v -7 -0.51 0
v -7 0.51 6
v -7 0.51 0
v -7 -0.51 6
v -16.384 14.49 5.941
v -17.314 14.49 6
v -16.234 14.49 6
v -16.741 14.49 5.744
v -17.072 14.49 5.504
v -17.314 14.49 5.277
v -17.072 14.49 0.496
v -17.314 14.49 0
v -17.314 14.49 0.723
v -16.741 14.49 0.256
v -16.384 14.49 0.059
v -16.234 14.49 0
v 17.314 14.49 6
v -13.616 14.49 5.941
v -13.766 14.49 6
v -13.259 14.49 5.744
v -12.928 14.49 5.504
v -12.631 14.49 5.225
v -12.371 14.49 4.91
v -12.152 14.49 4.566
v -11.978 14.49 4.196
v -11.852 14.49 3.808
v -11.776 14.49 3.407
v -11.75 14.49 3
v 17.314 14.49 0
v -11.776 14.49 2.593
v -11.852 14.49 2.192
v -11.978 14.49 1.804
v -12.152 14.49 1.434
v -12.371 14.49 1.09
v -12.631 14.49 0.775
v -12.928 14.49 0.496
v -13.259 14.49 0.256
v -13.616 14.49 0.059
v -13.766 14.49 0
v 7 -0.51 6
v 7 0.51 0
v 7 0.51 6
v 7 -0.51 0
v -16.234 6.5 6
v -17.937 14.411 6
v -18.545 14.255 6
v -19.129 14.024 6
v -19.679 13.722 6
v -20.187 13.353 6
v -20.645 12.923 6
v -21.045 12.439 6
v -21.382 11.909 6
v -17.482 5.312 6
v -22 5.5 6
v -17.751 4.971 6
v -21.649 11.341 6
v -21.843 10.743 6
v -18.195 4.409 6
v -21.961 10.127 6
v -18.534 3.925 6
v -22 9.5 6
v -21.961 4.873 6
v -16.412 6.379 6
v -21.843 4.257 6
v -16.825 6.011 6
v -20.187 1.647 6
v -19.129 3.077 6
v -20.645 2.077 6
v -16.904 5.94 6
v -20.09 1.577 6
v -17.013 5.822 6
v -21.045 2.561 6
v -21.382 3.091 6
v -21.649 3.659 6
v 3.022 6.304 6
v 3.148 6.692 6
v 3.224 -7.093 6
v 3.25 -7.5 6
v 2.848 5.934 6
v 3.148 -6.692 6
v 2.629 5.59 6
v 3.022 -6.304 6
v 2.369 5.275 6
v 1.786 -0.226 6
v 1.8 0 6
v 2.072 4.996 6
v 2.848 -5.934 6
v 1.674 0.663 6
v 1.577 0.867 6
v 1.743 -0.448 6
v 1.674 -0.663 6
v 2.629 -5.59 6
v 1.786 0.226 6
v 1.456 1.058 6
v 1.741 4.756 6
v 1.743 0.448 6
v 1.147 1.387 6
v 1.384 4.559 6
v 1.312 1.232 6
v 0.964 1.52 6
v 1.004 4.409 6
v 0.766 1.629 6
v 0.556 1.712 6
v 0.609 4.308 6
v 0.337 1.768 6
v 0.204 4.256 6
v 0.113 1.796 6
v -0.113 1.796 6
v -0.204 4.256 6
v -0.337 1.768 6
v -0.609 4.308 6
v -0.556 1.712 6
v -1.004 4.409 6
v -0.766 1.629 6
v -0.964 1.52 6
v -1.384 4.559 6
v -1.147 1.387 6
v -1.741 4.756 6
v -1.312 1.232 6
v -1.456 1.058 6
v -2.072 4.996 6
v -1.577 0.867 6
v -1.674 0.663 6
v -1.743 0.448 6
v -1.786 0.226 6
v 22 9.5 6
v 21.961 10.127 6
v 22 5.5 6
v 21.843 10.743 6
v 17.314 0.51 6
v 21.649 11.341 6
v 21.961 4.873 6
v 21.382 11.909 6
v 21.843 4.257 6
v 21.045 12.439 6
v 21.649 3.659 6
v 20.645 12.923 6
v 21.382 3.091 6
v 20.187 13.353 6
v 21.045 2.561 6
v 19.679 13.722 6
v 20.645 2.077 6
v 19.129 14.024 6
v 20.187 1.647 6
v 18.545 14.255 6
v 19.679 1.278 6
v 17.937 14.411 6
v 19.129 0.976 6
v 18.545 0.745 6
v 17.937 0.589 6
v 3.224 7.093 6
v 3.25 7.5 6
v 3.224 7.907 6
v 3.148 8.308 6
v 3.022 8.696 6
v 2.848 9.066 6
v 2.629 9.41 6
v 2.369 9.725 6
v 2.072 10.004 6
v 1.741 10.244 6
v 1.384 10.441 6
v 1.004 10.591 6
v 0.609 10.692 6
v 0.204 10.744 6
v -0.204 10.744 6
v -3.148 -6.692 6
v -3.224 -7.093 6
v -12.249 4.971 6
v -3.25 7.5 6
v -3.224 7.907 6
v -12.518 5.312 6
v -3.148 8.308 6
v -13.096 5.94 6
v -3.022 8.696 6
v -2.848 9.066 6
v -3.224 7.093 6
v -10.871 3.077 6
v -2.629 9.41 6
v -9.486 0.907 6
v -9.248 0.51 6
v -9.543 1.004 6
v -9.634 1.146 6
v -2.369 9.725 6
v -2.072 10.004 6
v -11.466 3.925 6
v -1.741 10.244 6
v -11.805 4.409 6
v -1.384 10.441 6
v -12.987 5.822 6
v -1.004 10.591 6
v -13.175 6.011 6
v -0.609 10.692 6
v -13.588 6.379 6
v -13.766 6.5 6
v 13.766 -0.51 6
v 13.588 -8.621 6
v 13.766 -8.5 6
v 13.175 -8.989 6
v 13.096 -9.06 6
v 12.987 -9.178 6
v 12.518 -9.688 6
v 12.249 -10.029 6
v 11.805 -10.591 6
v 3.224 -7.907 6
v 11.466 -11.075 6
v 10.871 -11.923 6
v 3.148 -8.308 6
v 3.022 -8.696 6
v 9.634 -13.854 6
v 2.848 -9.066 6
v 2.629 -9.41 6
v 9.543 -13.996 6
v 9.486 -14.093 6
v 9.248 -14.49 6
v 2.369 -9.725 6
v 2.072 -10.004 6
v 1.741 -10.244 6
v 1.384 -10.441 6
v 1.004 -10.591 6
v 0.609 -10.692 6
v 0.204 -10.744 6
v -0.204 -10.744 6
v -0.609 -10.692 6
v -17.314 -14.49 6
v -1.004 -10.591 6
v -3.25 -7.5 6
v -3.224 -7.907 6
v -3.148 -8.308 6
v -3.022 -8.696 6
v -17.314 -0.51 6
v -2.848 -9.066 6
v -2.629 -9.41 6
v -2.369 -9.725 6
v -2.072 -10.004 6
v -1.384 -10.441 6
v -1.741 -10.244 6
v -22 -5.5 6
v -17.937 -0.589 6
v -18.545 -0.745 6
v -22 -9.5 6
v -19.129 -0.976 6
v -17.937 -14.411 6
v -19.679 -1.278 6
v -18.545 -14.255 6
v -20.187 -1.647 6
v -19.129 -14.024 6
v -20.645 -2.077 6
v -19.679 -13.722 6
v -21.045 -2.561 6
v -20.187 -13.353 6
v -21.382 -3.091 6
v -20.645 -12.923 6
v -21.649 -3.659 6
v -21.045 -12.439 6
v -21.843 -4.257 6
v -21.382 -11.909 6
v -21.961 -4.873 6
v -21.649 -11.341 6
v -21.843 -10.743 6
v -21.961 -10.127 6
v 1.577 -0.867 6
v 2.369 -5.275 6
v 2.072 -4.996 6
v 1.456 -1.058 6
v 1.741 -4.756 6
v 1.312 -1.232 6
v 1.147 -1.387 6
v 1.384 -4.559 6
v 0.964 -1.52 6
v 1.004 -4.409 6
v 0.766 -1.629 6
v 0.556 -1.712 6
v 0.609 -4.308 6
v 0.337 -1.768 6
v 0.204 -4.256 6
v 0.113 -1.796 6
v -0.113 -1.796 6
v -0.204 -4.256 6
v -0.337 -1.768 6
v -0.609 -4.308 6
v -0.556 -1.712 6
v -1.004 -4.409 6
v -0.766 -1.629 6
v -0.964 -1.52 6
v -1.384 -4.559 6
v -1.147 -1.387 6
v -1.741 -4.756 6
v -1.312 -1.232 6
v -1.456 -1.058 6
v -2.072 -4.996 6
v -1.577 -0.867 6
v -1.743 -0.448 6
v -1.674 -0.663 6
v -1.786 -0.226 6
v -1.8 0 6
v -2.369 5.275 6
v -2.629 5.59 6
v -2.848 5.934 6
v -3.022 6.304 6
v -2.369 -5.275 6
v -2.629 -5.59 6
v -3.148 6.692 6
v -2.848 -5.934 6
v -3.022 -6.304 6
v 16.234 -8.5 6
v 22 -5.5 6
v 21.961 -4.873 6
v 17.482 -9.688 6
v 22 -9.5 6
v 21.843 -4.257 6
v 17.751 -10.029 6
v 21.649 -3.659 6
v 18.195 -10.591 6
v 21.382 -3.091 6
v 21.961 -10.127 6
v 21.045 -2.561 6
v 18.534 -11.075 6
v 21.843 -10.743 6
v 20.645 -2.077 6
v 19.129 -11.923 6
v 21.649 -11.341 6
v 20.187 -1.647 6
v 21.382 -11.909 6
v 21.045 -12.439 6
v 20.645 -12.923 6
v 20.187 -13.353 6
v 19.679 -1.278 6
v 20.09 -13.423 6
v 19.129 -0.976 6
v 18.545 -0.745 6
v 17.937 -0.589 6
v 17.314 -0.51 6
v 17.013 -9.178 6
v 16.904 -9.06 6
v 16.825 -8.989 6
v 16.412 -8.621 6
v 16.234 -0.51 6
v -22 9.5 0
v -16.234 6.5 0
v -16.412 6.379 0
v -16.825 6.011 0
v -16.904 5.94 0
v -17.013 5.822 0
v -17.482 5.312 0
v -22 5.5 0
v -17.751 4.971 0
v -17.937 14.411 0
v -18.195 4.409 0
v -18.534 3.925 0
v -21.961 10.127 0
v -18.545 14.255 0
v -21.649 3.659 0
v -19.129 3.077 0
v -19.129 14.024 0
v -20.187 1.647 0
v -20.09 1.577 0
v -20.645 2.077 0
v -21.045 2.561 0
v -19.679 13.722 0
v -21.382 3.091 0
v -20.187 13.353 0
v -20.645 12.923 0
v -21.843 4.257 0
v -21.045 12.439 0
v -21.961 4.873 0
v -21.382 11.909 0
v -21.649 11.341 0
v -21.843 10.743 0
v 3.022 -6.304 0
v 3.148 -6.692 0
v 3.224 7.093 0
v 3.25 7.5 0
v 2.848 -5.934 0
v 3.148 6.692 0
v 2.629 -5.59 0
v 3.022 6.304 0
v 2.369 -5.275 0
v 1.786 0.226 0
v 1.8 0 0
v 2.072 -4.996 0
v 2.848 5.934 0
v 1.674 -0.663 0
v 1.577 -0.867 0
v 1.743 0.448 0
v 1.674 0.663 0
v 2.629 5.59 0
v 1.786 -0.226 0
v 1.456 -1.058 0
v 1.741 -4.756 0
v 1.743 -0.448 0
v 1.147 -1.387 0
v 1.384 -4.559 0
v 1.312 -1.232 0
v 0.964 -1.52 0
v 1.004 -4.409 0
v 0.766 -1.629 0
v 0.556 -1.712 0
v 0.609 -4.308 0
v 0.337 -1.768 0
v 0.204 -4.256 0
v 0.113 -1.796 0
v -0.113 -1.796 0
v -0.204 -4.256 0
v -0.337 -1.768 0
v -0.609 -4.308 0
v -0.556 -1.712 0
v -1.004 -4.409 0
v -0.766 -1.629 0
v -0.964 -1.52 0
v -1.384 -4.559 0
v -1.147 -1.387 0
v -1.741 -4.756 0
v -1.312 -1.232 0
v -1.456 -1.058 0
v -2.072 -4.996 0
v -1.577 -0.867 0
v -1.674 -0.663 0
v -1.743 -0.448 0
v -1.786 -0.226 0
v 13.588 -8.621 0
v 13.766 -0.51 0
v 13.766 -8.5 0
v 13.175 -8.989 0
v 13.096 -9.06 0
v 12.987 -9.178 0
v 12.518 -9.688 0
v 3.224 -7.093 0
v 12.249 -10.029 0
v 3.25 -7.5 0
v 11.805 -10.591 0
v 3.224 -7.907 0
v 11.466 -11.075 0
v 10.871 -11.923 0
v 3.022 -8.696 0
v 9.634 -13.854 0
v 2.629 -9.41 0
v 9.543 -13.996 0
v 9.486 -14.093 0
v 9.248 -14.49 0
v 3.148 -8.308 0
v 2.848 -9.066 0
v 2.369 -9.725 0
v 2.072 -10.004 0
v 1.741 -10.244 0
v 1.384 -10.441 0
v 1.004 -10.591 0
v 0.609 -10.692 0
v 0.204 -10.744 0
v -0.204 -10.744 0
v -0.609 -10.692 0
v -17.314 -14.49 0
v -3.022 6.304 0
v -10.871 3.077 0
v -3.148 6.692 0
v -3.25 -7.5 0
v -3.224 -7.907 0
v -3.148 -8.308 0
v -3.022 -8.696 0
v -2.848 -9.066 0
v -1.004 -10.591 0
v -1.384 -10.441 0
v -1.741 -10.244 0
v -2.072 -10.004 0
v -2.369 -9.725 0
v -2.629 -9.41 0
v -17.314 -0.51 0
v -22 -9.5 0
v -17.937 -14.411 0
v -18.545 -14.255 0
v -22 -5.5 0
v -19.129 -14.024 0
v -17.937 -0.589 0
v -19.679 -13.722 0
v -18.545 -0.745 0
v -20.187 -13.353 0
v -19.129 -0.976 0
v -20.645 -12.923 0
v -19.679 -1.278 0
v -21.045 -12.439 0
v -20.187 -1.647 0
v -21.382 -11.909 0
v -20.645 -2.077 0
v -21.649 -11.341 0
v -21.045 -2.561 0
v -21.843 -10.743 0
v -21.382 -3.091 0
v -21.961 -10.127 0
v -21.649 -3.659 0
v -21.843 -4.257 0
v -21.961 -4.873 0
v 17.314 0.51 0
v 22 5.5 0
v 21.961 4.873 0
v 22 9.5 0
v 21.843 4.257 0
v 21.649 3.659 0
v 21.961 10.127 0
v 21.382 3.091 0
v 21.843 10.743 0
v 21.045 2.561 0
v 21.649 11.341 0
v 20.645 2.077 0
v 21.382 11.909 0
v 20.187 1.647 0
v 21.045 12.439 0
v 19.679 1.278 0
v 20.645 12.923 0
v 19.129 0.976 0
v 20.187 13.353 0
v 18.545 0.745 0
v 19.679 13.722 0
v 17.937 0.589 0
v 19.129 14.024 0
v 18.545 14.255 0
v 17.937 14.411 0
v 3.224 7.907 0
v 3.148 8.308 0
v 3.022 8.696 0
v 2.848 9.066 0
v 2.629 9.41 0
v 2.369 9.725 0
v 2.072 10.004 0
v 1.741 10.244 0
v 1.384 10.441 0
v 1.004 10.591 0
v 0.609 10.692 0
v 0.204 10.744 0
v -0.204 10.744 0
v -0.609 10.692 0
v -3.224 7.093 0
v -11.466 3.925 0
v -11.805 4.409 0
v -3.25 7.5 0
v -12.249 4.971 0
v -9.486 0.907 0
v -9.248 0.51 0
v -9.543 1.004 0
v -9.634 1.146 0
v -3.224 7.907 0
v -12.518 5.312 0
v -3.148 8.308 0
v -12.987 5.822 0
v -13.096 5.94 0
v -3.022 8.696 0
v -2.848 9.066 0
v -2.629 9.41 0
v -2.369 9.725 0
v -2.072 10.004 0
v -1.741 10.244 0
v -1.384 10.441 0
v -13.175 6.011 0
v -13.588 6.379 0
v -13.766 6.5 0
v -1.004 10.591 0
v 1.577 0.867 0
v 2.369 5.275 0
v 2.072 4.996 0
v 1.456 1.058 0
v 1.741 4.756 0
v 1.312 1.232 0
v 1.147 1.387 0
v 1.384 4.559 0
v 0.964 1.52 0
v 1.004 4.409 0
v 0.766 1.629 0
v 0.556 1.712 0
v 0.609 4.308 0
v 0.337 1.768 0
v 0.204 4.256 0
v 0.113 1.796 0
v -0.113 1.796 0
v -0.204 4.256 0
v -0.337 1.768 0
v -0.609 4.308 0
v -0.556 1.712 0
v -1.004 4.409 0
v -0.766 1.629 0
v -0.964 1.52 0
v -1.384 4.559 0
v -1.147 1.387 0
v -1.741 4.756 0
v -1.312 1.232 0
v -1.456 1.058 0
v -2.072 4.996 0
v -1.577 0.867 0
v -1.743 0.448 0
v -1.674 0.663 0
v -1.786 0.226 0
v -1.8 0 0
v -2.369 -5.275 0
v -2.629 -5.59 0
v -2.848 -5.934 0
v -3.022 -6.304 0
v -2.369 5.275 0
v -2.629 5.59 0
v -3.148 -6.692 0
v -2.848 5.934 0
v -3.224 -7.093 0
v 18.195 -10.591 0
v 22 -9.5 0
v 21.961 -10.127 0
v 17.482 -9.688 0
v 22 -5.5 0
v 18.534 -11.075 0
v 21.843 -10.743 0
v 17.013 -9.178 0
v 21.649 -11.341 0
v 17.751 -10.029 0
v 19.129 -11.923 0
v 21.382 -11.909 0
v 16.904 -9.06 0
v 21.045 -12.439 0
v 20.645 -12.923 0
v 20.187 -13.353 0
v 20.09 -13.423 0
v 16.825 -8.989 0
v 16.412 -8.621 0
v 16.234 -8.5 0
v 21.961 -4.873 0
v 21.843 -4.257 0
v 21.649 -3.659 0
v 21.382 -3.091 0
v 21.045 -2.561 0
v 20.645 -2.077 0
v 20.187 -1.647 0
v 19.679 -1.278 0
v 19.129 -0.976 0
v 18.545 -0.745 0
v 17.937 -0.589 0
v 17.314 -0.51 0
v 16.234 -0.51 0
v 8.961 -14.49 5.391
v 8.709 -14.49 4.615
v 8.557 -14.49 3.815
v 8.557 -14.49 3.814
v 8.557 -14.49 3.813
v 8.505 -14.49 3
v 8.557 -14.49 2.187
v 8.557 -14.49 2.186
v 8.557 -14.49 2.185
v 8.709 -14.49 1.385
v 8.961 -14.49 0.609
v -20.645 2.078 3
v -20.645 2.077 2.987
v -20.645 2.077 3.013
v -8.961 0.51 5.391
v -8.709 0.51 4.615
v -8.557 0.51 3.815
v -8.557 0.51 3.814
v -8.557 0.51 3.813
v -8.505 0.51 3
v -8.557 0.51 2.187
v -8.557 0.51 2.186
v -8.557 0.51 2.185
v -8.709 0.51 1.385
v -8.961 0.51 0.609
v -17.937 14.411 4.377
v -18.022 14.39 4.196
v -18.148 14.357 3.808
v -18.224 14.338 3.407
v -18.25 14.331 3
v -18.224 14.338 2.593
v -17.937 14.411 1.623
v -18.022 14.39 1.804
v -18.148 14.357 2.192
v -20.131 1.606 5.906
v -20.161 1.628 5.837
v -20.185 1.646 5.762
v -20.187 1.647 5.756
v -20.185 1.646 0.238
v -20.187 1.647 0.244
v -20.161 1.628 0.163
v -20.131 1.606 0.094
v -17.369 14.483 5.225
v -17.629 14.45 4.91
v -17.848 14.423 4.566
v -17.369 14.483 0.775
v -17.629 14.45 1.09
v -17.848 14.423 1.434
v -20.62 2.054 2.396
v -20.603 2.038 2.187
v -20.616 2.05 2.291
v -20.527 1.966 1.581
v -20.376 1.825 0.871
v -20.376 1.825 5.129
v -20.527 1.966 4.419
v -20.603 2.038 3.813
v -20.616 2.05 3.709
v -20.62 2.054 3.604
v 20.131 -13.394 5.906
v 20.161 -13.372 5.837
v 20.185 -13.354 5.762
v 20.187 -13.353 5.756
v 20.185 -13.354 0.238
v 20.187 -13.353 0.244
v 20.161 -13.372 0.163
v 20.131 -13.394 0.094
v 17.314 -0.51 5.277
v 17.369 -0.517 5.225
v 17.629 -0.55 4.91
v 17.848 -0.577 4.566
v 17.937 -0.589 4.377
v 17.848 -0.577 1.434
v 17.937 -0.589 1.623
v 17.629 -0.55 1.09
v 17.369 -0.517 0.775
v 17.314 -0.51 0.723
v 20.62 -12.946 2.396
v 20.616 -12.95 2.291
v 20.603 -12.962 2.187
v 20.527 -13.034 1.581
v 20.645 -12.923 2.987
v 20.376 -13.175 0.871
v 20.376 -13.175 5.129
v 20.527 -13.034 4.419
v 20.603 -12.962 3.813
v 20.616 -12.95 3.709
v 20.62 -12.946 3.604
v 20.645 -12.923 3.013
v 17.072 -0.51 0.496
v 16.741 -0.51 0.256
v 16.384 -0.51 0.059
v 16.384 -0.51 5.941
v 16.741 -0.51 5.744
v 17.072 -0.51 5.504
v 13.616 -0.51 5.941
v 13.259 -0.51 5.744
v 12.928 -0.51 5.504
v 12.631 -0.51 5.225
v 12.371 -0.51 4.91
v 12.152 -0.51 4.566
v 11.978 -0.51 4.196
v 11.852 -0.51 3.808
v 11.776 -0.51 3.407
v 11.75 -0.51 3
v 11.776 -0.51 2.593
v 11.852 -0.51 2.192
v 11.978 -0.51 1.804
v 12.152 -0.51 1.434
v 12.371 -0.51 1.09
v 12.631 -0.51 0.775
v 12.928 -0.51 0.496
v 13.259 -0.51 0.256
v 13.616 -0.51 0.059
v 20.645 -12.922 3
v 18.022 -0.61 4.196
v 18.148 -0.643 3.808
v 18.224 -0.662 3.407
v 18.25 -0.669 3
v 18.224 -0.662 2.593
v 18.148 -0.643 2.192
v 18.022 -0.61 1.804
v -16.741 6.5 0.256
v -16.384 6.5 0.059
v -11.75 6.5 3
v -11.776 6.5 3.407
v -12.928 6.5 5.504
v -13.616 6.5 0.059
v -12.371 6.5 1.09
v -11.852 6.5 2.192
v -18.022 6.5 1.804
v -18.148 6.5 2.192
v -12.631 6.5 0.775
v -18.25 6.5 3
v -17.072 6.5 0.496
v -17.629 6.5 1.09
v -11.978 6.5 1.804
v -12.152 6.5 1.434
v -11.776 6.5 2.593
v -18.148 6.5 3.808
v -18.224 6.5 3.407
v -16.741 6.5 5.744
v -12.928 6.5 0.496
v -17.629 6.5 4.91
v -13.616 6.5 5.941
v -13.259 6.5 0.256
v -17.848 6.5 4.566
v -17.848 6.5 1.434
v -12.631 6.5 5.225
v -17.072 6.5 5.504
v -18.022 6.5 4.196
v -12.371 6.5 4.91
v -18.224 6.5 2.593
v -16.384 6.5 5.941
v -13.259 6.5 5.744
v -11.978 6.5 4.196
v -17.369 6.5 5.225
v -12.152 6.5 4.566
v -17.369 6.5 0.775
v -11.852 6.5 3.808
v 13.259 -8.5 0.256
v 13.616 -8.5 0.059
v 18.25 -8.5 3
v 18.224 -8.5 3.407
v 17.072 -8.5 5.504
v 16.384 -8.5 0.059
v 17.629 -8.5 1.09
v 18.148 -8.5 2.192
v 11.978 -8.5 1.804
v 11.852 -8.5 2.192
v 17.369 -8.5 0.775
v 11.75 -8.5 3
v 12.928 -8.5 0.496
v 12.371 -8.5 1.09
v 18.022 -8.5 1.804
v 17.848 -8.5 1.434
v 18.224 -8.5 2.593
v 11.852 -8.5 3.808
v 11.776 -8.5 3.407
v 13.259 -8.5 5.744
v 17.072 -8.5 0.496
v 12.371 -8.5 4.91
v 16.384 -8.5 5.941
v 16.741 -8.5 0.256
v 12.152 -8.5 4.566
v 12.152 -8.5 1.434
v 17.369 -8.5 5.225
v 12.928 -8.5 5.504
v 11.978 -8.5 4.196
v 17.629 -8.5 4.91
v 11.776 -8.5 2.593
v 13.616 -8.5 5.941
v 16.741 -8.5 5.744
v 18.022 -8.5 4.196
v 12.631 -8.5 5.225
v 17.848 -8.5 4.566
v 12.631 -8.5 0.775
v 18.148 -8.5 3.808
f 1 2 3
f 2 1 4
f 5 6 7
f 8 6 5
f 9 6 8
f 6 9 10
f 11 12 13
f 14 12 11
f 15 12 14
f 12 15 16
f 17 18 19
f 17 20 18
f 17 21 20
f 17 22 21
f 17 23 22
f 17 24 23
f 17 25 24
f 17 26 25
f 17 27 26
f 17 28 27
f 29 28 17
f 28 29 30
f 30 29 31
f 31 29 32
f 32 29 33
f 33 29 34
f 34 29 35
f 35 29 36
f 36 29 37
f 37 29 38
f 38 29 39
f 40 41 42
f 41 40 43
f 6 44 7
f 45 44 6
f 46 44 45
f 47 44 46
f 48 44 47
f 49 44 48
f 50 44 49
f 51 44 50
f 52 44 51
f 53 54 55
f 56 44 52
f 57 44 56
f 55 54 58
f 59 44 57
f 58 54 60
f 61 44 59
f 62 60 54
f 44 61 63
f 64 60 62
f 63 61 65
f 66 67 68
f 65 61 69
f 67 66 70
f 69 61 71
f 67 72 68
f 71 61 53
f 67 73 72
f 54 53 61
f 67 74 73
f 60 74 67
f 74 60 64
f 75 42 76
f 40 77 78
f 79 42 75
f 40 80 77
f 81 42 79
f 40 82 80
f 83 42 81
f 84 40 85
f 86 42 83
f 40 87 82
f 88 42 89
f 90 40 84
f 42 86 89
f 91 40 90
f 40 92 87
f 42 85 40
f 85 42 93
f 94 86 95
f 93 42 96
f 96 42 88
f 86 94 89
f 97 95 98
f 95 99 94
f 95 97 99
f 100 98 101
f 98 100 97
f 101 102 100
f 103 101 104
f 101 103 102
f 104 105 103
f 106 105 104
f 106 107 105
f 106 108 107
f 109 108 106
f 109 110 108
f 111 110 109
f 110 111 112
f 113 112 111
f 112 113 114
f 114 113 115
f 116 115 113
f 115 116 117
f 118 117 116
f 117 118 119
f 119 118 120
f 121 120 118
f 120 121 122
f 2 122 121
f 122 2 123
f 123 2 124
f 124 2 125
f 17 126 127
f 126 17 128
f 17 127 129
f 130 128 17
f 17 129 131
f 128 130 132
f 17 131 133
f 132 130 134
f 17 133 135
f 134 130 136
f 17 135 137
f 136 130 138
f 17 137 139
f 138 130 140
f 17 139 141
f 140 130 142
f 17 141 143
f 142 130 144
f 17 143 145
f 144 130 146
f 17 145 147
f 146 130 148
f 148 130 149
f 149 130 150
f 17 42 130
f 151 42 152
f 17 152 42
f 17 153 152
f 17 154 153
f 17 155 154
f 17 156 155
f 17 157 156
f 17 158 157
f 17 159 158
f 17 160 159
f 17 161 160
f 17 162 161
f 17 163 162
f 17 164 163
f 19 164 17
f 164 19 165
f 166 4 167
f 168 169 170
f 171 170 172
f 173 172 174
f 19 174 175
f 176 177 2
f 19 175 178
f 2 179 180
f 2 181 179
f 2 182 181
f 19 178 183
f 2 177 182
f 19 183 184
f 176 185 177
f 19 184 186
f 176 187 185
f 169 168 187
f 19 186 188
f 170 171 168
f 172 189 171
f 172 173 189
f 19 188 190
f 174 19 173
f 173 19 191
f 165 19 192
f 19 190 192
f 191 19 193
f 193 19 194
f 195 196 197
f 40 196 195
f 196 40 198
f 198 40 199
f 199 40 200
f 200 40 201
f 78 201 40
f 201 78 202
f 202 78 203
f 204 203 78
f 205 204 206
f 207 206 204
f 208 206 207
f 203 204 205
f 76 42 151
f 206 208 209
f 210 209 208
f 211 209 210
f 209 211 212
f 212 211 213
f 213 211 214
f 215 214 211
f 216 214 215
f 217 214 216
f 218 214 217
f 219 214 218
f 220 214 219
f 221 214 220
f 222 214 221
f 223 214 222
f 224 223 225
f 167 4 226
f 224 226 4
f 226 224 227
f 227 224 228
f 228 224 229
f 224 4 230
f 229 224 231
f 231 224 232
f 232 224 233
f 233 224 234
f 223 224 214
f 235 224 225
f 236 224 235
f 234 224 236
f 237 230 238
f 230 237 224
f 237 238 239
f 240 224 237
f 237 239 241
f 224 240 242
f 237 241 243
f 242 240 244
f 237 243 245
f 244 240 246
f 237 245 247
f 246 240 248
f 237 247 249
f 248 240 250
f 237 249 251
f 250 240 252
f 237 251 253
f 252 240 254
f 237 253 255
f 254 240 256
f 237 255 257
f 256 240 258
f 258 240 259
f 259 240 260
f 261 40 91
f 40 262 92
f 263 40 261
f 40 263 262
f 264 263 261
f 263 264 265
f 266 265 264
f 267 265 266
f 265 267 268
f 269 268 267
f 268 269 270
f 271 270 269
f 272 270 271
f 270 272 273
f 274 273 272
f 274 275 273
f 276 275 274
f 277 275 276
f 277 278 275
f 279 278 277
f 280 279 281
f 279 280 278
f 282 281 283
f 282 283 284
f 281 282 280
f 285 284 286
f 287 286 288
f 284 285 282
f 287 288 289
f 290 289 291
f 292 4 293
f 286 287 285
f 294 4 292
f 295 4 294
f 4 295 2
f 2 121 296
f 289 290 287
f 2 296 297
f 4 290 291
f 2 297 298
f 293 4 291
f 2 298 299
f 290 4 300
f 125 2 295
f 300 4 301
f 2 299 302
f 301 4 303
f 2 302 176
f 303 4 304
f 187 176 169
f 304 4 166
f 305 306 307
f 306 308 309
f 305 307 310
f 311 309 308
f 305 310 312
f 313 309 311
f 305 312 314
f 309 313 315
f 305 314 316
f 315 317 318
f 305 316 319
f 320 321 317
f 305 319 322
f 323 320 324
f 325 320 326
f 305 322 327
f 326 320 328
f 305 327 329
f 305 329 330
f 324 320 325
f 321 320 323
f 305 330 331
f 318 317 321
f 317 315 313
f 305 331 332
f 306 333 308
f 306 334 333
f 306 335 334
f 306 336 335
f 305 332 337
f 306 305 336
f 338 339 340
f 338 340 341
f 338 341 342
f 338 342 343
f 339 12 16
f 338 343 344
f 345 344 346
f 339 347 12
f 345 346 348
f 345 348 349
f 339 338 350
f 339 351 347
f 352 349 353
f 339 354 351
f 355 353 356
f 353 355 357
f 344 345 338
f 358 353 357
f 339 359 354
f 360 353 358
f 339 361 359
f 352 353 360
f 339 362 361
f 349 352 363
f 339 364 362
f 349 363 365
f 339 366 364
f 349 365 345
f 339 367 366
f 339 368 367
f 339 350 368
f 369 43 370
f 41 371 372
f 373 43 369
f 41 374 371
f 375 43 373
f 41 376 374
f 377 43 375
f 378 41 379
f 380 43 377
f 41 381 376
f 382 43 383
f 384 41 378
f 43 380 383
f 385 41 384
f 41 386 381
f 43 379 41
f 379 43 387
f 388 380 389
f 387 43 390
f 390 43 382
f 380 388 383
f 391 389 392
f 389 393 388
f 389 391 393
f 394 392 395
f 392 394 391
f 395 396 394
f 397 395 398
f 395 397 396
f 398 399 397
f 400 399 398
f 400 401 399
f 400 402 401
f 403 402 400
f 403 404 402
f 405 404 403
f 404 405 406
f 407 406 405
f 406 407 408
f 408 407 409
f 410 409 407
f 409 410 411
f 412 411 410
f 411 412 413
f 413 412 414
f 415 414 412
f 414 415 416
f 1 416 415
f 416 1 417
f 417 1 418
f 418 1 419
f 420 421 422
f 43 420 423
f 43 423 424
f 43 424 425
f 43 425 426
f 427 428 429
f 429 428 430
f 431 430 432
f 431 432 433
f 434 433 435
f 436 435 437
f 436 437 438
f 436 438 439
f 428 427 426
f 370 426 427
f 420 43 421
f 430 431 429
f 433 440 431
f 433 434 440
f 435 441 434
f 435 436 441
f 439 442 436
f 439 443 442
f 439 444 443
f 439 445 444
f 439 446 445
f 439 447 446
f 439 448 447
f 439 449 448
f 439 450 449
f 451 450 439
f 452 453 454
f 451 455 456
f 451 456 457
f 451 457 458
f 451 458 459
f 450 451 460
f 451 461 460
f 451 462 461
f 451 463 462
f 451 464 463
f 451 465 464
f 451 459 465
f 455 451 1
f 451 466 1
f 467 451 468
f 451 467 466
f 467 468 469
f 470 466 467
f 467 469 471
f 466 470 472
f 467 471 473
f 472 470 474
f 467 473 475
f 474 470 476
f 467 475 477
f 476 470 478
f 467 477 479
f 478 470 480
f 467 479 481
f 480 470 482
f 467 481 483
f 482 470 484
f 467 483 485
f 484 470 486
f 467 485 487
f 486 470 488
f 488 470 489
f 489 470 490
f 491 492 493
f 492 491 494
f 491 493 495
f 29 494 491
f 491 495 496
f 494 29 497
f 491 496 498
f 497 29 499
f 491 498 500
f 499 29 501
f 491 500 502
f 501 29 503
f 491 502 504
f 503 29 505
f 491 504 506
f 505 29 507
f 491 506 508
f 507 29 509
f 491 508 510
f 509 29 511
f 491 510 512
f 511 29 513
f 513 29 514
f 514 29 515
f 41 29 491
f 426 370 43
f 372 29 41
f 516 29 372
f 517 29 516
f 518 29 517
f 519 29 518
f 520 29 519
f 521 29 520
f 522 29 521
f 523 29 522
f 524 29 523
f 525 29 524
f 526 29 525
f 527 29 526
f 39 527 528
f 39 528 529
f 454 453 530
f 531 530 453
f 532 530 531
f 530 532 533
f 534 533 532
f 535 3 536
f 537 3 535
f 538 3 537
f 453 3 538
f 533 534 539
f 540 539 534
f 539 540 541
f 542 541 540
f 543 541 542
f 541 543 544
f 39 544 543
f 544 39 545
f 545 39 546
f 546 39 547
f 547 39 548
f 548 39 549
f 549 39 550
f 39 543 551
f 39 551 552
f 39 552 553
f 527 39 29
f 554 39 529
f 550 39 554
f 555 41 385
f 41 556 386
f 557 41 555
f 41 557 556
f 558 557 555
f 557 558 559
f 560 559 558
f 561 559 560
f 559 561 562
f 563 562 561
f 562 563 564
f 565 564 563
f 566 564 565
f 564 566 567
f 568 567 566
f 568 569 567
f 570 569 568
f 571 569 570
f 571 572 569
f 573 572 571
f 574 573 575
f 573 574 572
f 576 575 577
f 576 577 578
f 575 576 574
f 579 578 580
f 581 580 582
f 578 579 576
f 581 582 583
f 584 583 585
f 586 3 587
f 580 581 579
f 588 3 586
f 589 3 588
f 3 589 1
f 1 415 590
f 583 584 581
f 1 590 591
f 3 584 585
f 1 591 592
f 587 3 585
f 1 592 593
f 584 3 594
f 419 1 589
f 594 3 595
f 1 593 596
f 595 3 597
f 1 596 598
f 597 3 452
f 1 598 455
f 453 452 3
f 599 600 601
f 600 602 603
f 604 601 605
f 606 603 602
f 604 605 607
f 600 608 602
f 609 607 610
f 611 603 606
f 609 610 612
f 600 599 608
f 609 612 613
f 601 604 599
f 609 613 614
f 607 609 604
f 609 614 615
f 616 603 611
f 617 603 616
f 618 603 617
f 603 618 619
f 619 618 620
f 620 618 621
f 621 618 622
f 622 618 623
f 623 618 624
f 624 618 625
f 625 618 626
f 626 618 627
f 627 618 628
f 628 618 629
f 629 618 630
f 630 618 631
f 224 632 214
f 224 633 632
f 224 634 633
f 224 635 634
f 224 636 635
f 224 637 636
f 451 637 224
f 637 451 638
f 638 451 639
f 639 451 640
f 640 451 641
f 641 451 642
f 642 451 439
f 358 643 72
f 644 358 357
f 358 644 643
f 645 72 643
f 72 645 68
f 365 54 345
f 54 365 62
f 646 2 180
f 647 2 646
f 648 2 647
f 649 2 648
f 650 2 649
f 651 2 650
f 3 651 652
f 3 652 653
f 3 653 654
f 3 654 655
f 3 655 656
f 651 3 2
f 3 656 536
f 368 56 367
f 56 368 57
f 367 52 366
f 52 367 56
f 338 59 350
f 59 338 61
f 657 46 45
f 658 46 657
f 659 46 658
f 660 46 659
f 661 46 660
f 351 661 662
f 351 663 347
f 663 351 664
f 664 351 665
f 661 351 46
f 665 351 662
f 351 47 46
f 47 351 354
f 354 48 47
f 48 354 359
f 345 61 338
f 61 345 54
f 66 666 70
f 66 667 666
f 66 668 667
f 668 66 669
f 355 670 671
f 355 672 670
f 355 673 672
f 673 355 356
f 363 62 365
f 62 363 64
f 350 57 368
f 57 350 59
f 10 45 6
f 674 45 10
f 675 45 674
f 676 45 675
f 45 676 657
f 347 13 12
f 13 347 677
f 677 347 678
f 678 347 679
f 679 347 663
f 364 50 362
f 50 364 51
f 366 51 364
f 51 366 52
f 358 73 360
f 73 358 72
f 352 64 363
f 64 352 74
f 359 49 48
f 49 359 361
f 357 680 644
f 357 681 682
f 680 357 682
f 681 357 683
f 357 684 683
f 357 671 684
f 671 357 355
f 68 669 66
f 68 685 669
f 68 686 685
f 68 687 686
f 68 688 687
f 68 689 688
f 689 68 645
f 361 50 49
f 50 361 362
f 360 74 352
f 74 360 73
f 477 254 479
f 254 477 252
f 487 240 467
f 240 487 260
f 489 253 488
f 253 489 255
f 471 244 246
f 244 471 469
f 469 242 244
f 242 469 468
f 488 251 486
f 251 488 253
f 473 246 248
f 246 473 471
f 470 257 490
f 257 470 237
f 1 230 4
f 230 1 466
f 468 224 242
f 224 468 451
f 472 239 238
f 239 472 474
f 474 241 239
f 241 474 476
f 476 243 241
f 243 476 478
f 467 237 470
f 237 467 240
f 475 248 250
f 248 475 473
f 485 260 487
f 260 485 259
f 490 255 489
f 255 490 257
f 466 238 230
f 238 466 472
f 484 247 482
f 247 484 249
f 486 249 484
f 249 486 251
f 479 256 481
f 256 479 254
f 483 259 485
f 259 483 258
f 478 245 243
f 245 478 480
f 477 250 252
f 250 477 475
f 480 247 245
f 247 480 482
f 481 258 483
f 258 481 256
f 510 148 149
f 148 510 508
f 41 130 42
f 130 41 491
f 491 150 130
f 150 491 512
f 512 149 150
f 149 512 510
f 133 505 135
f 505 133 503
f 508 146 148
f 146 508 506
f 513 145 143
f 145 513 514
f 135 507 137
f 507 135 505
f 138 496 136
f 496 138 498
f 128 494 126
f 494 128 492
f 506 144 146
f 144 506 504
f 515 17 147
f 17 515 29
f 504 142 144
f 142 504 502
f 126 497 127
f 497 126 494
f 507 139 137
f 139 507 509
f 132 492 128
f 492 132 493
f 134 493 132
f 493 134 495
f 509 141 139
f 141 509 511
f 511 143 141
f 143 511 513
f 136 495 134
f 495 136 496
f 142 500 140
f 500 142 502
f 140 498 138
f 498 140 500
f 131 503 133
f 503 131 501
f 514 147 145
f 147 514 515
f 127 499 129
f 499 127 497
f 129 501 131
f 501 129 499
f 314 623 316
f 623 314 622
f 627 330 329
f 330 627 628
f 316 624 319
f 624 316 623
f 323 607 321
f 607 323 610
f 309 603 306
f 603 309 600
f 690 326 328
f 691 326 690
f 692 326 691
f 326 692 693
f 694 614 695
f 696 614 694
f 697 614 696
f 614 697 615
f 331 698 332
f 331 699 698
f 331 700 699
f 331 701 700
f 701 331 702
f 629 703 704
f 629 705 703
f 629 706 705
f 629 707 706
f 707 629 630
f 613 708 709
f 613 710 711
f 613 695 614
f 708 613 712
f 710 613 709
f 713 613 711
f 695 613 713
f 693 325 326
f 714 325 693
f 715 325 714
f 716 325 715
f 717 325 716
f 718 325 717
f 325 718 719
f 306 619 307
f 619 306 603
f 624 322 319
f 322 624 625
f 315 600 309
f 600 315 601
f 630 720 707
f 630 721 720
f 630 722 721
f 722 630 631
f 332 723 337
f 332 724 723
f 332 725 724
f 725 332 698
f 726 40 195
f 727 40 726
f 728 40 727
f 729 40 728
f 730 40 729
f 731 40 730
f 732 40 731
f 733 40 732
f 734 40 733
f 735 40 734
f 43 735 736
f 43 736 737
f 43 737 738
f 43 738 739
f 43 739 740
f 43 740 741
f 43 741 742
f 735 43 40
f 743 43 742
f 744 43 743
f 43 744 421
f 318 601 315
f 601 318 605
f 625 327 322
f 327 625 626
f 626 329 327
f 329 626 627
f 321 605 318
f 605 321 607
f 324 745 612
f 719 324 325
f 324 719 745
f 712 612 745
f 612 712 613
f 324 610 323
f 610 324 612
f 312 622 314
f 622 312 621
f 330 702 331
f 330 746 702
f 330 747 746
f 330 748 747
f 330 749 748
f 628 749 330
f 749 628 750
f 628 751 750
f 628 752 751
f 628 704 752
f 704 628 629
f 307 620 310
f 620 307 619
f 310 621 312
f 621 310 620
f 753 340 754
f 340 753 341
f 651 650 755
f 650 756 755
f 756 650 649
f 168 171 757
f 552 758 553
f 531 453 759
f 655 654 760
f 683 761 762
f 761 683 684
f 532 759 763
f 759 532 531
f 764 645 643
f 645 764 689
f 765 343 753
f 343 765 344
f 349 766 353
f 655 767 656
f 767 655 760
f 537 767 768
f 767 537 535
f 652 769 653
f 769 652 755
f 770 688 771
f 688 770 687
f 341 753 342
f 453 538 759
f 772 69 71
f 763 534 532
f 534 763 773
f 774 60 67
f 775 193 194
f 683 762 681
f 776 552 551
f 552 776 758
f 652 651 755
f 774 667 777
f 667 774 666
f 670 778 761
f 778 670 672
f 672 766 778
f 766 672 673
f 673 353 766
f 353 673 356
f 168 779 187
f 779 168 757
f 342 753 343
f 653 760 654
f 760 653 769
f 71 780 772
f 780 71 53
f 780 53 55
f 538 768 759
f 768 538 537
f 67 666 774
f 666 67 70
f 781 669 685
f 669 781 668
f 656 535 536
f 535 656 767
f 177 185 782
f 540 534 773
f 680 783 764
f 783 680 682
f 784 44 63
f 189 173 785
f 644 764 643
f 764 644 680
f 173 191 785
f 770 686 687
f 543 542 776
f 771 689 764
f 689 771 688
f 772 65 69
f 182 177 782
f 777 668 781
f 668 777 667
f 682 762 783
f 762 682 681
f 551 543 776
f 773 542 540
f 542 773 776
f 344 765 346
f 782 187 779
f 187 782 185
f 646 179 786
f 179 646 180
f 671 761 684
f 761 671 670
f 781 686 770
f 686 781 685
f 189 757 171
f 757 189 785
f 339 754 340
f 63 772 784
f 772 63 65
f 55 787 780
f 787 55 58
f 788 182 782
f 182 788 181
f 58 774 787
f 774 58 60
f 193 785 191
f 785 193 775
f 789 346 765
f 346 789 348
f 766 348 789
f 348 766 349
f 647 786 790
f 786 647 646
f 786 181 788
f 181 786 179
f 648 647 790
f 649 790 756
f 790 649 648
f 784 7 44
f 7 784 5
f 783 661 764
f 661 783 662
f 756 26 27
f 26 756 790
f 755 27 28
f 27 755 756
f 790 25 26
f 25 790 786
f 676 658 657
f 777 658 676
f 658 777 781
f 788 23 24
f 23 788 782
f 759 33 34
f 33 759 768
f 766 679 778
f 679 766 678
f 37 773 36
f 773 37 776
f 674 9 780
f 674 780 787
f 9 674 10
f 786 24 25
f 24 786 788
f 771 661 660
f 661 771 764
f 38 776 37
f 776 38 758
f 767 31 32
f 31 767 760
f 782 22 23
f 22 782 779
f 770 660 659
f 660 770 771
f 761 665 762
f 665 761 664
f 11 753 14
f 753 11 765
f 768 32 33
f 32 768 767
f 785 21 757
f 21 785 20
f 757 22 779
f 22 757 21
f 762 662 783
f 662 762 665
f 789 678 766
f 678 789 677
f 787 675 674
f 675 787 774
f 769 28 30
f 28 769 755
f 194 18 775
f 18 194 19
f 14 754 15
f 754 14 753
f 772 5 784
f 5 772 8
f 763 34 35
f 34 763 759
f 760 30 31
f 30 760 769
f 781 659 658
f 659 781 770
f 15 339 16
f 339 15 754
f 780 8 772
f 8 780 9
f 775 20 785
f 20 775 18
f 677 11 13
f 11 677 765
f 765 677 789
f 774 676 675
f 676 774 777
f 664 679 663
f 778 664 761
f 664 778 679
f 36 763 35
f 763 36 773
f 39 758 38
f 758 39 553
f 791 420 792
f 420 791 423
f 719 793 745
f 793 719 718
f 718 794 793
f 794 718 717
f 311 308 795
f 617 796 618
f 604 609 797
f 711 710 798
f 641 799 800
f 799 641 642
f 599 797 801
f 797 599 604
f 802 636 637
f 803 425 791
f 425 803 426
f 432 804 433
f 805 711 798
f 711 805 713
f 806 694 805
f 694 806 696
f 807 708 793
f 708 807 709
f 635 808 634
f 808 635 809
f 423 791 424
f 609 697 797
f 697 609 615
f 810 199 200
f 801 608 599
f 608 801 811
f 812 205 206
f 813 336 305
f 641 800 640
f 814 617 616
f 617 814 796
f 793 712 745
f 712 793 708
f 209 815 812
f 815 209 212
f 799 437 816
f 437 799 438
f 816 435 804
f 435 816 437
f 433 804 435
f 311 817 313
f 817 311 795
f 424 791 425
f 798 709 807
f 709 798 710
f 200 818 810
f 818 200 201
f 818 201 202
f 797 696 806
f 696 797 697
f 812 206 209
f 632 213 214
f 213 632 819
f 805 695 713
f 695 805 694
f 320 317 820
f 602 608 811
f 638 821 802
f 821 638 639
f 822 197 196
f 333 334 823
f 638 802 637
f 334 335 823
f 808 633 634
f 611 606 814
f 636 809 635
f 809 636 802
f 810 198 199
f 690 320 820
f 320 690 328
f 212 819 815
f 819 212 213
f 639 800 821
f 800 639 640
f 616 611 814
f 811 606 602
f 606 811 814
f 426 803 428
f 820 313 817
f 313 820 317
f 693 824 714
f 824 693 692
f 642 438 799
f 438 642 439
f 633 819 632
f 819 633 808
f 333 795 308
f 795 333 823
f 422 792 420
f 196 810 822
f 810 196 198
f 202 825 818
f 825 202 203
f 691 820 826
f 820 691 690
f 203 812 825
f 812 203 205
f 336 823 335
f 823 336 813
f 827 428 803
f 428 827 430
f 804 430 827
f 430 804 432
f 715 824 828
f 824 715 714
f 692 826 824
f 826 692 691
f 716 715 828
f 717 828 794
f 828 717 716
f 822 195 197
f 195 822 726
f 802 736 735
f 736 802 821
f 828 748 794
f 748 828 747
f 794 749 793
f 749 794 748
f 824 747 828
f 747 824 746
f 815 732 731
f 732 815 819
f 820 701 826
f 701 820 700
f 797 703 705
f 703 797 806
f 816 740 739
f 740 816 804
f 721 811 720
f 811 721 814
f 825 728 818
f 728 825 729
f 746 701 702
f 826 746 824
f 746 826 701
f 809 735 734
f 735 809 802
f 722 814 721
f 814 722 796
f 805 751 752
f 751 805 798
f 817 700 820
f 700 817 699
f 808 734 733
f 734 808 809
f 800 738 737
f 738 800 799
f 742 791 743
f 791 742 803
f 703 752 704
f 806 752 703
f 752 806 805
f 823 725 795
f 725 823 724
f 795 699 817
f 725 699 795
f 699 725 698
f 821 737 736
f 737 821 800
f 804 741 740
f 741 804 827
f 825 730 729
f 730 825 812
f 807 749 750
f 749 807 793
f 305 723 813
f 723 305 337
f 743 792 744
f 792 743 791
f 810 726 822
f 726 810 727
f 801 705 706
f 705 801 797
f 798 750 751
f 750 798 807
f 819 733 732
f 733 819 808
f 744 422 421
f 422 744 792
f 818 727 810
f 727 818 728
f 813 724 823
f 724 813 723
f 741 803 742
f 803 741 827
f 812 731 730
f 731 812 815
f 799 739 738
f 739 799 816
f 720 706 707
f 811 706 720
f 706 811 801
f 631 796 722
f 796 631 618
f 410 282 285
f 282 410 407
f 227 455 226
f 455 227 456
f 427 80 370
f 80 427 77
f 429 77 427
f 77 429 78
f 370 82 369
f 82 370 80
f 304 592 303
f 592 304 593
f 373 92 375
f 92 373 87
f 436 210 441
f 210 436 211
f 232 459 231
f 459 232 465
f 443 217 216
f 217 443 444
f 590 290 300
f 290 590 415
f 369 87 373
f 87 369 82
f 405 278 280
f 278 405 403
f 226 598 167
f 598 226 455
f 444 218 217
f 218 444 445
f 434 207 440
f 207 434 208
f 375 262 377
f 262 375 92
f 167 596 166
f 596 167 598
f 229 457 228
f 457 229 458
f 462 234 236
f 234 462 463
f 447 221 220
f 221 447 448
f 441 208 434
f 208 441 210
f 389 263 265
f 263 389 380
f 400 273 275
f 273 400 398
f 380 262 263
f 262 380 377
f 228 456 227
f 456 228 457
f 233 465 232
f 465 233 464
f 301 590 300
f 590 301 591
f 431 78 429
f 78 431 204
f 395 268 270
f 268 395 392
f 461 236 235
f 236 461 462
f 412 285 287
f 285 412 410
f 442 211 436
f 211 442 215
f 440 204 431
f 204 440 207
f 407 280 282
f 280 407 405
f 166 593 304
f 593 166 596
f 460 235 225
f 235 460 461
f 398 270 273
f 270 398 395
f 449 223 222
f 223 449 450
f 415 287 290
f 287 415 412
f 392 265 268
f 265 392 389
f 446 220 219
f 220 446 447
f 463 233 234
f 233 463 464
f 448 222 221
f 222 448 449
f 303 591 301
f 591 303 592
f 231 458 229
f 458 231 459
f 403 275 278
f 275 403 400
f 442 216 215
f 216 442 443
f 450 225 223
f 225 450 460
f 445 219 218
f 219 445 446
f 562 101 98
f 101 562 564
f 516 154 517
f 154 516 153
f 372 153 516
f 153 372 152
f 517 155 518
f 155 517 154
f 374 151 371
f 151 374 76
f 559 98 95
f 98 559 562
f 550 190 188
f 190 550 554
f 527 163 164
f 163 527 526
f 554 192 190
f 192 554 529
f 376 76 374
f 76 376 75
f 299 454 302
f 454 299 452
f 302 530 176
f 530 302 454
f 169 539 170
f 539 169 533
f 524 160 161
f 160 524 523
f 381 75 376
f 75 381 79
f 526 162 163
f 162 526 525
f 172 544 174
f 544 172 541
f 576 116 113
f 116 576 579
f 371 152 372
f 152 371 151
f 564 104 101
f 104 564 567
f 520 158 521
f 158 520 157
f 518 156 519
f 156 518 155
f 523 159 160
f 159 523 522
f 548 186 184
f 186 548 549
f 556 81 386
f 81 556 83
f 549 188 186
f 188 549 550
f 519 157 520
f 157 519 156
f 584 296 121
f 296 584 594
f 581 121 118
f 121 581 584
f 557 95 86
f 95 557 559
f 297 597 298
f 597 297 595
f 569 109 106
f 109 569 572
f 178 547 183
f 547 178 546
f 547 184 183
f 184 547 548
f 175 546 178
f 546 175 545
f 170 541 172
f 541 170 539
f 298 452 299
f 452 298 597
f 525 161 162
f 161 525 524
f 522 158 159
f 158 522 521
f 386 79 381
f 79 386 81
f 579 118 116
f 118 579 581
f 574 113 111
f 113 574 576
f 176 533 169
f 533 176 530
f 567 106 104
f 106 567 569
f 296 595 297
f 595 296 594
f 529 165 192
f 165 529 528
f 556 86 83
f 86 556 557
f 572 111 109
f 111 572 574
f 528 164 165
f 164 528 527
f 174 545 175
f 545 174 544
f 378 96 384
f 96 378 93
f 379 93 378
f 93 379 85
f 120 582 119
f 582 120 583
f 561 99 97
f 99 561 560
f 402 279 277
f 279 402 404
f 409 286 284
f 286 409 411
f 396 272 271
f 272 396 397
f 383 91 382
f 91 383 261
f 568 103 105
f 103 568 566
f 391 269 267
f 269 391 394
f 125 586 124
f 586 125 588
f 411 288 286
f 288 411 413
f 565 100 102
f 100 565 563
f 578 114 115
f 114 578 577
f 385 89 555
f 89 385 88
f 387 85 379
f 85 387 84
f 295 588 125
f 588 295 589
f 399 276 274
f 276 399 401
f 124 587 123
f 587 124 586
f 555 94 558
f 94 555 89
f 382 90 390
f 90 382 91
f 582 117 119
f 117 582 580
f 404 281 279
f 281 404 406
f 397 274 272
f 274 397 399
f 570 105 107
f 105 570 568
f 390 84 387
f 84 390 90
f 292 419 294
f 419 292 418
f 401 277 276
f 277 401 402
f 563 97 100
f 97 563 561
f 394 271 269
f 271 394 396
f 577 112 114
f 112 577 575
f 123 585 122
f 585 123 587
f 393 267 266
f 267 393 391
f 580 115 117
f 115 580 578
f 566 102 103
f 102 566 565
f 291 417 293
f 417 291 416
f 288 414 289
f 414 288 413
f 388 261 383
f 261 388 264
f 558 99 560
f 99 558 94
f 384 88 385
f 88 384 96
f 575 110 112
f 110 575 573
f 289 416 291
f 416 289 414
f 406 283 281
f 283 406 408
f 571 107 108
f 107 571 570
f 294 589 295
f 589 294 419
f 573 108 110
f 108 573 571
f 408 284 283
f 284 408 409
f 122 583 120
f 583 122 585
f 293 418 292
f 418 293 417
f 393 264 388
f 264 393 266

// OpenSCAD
$fn = 50;


difference() {
	union() {
		hull() {
			translate(v = [-2.0000000000, 9.5000000000, 0]) {
				cylinder(h = 6, r = 5);
			}
			translate(v = [2.0000000000, 9.5000000000, 0]) {
				cylinder(h = 6, r = 5);
			}
			translate(v = [-2.0000000000, -9.5000000000, 0]) {
				cylinder(h = 6, r = 5);
			}
			translate(v = [2.0000000000, -9.5000000000, 0]) {
				cylinder(h = 6, r = 5);
			}
		}
		translate(v = [-7.5000000000, 7.5000000000, 0]) {
			hull() {
				translate(v = [-9.5000000000, 2.0000000000, 0]) {
					cylinder(h = 6, r = 5);
				}
				translate(v = [9.5000000000, 2.0000000000, 0]) {
					cylinder(h = 6, r = 5);
				}
				translate(v = [-9.5000000000, -2.0000000000, 0]) {
					cylinder(h = 6, r = 5);
				}
				translate(v = [9.5000000000, -2.0000000000, 0]) {
					cylinder(h = 6, r = 5);
				}
			}
		}
		translate(v = [-7.5000000000, -7.5000000000, 0]) {
			hull() {
				translate(v = [-9.5000000000, 2.0000000000, 0]) {
					cylinder(h = 6, r = 5);
				}
				translate(v = [9.5000000000, 2.0000000000, 0]) {
					cylinder(h = 6, r = 5);
				}
				translate(v = [-9.5000000000, -2.0000000000, 0]) {
					cylinder(h = 6, r = 5);
				}
				translate(v = [9.5000000000, -2.0000000000, 0]) {
					cylinder(h = 6, r = 5);
				}
			}
		}
		translate(v = [7.5000000000, 7.5000000000, 0]) {
			hull() {
				translate(v = [-9.5000000000, 2.0000000000, 0]) {
					cylinder(h = 6, r = 5);
				}
				translate(v = [9.5000000000, 2.0000000000, 0]) {
					cylinder(h = 6, r = 5);
				}
				translate(v = [-9.5000000000, -2.0000000000, 0]) {
					cylinder(h = 6, r = 5);
				}
				translate(v = [9.5000000000, -2.0000000000, 0]) {
					cylinder(h = 6, r = 5);
				}
			}
		}
		translate(v = [7.5000000000, -7.5000000000, 0]) {
			hull() {
				translate(v = [-9.5000000000, 2.0000000000, 0]) {
					cylinder(h = 6, r = 5);
				}
				translate(v = [9.5000000000, 2.0000000000, 0]) {
					cylinder(h = 6, r = 5);
				}
				translate(v = [-9.5000000000, -2.0000000000, 0]) {
					cylinder(h = 6, r = 5);
				}
				translate(v = [9.5000000000, -2.0000000000, 0]) {
					cylinder(h = 6, r = 5);
				}
			}
		}
	}
	union() {
		translate(v = [-15.0000000000, 0.5000000000, 3.0000000000]) {
			rotate(a = [90, 0, 0]) {
				difference() {
					union() {
						#translate(v = [0, 0, -14.0000000000]) {
							cylinder(h = 14, r = 2.2500000000);
						}
						#translate(v = [0, 0, -6]) {
							cylinder(h = 6, r1 = 3.2500000000, r2 = 6.5000000000);
						}
						#translate(v = [0, 0, -14.0000000000]) {
							cylinder(h = 14, r = 3.2500000000);
						}
						#translate(v = [0, 0, -14.0000000000]) {
							cylinder(h = 14, r = 2.2500000000);
						}
					}
					union();
				}
			}
		}
		translate(v = [15.0000000000, -14.5000000000, 3.0000000000]) {
			rotate(a = [90, 0, 0]) {
				difference() {
					union() {
						#translate(v = [0, 0, -14.0000000000]) {
							cylinder(h = 14, r = 2.2500000000);
						}
						#translate(v = [0, 0, -6]) {
							cylinder(h = 6, r1 = 3.2500000000, r2 = 6.5000000000);
						}
						#translate(v = [0, 0, -14.0000000000]) {
							cylinder(h = 14, r = 3.2500000000);
						}
						#translate(v = [0, 0, -14.0000000000]) {
							cylinder(h = 14, r = 2.2500000000);
						}
					}
					union();
				}
			}
		}
		translate(v = [0.0000000000, -7.5000000000, 0]) {
			translate(v = [0, 0, -100]) {
				cylinder(h = 200, r = 3.2500000000);
			}
		}
		translate(v = [0.0000000000, 7.5000000000, 0]) {
			translate(v = [0, 0, -100]) {
				cylinder(h = 200, r = 3.2500000000);
			}
		}
		translate(v = [0.0000000000, -7.5000000000, 0]) {
			translate(v = [0, 0, -100]) {
				cylinder(h = 200, r = 1.8000000000);
			}
		}
		translate(v = [0, 0, -100]) {
			cylinder(h = 200, r = 1.8000000000);
		}
		translate(v = [0.0000000000, 7.5000000000, 0]) {
			translate(v = [0, 0, -100]) {
				cylinder(h = 200, r = 1.8000000000);
			}
		}
	}
}
